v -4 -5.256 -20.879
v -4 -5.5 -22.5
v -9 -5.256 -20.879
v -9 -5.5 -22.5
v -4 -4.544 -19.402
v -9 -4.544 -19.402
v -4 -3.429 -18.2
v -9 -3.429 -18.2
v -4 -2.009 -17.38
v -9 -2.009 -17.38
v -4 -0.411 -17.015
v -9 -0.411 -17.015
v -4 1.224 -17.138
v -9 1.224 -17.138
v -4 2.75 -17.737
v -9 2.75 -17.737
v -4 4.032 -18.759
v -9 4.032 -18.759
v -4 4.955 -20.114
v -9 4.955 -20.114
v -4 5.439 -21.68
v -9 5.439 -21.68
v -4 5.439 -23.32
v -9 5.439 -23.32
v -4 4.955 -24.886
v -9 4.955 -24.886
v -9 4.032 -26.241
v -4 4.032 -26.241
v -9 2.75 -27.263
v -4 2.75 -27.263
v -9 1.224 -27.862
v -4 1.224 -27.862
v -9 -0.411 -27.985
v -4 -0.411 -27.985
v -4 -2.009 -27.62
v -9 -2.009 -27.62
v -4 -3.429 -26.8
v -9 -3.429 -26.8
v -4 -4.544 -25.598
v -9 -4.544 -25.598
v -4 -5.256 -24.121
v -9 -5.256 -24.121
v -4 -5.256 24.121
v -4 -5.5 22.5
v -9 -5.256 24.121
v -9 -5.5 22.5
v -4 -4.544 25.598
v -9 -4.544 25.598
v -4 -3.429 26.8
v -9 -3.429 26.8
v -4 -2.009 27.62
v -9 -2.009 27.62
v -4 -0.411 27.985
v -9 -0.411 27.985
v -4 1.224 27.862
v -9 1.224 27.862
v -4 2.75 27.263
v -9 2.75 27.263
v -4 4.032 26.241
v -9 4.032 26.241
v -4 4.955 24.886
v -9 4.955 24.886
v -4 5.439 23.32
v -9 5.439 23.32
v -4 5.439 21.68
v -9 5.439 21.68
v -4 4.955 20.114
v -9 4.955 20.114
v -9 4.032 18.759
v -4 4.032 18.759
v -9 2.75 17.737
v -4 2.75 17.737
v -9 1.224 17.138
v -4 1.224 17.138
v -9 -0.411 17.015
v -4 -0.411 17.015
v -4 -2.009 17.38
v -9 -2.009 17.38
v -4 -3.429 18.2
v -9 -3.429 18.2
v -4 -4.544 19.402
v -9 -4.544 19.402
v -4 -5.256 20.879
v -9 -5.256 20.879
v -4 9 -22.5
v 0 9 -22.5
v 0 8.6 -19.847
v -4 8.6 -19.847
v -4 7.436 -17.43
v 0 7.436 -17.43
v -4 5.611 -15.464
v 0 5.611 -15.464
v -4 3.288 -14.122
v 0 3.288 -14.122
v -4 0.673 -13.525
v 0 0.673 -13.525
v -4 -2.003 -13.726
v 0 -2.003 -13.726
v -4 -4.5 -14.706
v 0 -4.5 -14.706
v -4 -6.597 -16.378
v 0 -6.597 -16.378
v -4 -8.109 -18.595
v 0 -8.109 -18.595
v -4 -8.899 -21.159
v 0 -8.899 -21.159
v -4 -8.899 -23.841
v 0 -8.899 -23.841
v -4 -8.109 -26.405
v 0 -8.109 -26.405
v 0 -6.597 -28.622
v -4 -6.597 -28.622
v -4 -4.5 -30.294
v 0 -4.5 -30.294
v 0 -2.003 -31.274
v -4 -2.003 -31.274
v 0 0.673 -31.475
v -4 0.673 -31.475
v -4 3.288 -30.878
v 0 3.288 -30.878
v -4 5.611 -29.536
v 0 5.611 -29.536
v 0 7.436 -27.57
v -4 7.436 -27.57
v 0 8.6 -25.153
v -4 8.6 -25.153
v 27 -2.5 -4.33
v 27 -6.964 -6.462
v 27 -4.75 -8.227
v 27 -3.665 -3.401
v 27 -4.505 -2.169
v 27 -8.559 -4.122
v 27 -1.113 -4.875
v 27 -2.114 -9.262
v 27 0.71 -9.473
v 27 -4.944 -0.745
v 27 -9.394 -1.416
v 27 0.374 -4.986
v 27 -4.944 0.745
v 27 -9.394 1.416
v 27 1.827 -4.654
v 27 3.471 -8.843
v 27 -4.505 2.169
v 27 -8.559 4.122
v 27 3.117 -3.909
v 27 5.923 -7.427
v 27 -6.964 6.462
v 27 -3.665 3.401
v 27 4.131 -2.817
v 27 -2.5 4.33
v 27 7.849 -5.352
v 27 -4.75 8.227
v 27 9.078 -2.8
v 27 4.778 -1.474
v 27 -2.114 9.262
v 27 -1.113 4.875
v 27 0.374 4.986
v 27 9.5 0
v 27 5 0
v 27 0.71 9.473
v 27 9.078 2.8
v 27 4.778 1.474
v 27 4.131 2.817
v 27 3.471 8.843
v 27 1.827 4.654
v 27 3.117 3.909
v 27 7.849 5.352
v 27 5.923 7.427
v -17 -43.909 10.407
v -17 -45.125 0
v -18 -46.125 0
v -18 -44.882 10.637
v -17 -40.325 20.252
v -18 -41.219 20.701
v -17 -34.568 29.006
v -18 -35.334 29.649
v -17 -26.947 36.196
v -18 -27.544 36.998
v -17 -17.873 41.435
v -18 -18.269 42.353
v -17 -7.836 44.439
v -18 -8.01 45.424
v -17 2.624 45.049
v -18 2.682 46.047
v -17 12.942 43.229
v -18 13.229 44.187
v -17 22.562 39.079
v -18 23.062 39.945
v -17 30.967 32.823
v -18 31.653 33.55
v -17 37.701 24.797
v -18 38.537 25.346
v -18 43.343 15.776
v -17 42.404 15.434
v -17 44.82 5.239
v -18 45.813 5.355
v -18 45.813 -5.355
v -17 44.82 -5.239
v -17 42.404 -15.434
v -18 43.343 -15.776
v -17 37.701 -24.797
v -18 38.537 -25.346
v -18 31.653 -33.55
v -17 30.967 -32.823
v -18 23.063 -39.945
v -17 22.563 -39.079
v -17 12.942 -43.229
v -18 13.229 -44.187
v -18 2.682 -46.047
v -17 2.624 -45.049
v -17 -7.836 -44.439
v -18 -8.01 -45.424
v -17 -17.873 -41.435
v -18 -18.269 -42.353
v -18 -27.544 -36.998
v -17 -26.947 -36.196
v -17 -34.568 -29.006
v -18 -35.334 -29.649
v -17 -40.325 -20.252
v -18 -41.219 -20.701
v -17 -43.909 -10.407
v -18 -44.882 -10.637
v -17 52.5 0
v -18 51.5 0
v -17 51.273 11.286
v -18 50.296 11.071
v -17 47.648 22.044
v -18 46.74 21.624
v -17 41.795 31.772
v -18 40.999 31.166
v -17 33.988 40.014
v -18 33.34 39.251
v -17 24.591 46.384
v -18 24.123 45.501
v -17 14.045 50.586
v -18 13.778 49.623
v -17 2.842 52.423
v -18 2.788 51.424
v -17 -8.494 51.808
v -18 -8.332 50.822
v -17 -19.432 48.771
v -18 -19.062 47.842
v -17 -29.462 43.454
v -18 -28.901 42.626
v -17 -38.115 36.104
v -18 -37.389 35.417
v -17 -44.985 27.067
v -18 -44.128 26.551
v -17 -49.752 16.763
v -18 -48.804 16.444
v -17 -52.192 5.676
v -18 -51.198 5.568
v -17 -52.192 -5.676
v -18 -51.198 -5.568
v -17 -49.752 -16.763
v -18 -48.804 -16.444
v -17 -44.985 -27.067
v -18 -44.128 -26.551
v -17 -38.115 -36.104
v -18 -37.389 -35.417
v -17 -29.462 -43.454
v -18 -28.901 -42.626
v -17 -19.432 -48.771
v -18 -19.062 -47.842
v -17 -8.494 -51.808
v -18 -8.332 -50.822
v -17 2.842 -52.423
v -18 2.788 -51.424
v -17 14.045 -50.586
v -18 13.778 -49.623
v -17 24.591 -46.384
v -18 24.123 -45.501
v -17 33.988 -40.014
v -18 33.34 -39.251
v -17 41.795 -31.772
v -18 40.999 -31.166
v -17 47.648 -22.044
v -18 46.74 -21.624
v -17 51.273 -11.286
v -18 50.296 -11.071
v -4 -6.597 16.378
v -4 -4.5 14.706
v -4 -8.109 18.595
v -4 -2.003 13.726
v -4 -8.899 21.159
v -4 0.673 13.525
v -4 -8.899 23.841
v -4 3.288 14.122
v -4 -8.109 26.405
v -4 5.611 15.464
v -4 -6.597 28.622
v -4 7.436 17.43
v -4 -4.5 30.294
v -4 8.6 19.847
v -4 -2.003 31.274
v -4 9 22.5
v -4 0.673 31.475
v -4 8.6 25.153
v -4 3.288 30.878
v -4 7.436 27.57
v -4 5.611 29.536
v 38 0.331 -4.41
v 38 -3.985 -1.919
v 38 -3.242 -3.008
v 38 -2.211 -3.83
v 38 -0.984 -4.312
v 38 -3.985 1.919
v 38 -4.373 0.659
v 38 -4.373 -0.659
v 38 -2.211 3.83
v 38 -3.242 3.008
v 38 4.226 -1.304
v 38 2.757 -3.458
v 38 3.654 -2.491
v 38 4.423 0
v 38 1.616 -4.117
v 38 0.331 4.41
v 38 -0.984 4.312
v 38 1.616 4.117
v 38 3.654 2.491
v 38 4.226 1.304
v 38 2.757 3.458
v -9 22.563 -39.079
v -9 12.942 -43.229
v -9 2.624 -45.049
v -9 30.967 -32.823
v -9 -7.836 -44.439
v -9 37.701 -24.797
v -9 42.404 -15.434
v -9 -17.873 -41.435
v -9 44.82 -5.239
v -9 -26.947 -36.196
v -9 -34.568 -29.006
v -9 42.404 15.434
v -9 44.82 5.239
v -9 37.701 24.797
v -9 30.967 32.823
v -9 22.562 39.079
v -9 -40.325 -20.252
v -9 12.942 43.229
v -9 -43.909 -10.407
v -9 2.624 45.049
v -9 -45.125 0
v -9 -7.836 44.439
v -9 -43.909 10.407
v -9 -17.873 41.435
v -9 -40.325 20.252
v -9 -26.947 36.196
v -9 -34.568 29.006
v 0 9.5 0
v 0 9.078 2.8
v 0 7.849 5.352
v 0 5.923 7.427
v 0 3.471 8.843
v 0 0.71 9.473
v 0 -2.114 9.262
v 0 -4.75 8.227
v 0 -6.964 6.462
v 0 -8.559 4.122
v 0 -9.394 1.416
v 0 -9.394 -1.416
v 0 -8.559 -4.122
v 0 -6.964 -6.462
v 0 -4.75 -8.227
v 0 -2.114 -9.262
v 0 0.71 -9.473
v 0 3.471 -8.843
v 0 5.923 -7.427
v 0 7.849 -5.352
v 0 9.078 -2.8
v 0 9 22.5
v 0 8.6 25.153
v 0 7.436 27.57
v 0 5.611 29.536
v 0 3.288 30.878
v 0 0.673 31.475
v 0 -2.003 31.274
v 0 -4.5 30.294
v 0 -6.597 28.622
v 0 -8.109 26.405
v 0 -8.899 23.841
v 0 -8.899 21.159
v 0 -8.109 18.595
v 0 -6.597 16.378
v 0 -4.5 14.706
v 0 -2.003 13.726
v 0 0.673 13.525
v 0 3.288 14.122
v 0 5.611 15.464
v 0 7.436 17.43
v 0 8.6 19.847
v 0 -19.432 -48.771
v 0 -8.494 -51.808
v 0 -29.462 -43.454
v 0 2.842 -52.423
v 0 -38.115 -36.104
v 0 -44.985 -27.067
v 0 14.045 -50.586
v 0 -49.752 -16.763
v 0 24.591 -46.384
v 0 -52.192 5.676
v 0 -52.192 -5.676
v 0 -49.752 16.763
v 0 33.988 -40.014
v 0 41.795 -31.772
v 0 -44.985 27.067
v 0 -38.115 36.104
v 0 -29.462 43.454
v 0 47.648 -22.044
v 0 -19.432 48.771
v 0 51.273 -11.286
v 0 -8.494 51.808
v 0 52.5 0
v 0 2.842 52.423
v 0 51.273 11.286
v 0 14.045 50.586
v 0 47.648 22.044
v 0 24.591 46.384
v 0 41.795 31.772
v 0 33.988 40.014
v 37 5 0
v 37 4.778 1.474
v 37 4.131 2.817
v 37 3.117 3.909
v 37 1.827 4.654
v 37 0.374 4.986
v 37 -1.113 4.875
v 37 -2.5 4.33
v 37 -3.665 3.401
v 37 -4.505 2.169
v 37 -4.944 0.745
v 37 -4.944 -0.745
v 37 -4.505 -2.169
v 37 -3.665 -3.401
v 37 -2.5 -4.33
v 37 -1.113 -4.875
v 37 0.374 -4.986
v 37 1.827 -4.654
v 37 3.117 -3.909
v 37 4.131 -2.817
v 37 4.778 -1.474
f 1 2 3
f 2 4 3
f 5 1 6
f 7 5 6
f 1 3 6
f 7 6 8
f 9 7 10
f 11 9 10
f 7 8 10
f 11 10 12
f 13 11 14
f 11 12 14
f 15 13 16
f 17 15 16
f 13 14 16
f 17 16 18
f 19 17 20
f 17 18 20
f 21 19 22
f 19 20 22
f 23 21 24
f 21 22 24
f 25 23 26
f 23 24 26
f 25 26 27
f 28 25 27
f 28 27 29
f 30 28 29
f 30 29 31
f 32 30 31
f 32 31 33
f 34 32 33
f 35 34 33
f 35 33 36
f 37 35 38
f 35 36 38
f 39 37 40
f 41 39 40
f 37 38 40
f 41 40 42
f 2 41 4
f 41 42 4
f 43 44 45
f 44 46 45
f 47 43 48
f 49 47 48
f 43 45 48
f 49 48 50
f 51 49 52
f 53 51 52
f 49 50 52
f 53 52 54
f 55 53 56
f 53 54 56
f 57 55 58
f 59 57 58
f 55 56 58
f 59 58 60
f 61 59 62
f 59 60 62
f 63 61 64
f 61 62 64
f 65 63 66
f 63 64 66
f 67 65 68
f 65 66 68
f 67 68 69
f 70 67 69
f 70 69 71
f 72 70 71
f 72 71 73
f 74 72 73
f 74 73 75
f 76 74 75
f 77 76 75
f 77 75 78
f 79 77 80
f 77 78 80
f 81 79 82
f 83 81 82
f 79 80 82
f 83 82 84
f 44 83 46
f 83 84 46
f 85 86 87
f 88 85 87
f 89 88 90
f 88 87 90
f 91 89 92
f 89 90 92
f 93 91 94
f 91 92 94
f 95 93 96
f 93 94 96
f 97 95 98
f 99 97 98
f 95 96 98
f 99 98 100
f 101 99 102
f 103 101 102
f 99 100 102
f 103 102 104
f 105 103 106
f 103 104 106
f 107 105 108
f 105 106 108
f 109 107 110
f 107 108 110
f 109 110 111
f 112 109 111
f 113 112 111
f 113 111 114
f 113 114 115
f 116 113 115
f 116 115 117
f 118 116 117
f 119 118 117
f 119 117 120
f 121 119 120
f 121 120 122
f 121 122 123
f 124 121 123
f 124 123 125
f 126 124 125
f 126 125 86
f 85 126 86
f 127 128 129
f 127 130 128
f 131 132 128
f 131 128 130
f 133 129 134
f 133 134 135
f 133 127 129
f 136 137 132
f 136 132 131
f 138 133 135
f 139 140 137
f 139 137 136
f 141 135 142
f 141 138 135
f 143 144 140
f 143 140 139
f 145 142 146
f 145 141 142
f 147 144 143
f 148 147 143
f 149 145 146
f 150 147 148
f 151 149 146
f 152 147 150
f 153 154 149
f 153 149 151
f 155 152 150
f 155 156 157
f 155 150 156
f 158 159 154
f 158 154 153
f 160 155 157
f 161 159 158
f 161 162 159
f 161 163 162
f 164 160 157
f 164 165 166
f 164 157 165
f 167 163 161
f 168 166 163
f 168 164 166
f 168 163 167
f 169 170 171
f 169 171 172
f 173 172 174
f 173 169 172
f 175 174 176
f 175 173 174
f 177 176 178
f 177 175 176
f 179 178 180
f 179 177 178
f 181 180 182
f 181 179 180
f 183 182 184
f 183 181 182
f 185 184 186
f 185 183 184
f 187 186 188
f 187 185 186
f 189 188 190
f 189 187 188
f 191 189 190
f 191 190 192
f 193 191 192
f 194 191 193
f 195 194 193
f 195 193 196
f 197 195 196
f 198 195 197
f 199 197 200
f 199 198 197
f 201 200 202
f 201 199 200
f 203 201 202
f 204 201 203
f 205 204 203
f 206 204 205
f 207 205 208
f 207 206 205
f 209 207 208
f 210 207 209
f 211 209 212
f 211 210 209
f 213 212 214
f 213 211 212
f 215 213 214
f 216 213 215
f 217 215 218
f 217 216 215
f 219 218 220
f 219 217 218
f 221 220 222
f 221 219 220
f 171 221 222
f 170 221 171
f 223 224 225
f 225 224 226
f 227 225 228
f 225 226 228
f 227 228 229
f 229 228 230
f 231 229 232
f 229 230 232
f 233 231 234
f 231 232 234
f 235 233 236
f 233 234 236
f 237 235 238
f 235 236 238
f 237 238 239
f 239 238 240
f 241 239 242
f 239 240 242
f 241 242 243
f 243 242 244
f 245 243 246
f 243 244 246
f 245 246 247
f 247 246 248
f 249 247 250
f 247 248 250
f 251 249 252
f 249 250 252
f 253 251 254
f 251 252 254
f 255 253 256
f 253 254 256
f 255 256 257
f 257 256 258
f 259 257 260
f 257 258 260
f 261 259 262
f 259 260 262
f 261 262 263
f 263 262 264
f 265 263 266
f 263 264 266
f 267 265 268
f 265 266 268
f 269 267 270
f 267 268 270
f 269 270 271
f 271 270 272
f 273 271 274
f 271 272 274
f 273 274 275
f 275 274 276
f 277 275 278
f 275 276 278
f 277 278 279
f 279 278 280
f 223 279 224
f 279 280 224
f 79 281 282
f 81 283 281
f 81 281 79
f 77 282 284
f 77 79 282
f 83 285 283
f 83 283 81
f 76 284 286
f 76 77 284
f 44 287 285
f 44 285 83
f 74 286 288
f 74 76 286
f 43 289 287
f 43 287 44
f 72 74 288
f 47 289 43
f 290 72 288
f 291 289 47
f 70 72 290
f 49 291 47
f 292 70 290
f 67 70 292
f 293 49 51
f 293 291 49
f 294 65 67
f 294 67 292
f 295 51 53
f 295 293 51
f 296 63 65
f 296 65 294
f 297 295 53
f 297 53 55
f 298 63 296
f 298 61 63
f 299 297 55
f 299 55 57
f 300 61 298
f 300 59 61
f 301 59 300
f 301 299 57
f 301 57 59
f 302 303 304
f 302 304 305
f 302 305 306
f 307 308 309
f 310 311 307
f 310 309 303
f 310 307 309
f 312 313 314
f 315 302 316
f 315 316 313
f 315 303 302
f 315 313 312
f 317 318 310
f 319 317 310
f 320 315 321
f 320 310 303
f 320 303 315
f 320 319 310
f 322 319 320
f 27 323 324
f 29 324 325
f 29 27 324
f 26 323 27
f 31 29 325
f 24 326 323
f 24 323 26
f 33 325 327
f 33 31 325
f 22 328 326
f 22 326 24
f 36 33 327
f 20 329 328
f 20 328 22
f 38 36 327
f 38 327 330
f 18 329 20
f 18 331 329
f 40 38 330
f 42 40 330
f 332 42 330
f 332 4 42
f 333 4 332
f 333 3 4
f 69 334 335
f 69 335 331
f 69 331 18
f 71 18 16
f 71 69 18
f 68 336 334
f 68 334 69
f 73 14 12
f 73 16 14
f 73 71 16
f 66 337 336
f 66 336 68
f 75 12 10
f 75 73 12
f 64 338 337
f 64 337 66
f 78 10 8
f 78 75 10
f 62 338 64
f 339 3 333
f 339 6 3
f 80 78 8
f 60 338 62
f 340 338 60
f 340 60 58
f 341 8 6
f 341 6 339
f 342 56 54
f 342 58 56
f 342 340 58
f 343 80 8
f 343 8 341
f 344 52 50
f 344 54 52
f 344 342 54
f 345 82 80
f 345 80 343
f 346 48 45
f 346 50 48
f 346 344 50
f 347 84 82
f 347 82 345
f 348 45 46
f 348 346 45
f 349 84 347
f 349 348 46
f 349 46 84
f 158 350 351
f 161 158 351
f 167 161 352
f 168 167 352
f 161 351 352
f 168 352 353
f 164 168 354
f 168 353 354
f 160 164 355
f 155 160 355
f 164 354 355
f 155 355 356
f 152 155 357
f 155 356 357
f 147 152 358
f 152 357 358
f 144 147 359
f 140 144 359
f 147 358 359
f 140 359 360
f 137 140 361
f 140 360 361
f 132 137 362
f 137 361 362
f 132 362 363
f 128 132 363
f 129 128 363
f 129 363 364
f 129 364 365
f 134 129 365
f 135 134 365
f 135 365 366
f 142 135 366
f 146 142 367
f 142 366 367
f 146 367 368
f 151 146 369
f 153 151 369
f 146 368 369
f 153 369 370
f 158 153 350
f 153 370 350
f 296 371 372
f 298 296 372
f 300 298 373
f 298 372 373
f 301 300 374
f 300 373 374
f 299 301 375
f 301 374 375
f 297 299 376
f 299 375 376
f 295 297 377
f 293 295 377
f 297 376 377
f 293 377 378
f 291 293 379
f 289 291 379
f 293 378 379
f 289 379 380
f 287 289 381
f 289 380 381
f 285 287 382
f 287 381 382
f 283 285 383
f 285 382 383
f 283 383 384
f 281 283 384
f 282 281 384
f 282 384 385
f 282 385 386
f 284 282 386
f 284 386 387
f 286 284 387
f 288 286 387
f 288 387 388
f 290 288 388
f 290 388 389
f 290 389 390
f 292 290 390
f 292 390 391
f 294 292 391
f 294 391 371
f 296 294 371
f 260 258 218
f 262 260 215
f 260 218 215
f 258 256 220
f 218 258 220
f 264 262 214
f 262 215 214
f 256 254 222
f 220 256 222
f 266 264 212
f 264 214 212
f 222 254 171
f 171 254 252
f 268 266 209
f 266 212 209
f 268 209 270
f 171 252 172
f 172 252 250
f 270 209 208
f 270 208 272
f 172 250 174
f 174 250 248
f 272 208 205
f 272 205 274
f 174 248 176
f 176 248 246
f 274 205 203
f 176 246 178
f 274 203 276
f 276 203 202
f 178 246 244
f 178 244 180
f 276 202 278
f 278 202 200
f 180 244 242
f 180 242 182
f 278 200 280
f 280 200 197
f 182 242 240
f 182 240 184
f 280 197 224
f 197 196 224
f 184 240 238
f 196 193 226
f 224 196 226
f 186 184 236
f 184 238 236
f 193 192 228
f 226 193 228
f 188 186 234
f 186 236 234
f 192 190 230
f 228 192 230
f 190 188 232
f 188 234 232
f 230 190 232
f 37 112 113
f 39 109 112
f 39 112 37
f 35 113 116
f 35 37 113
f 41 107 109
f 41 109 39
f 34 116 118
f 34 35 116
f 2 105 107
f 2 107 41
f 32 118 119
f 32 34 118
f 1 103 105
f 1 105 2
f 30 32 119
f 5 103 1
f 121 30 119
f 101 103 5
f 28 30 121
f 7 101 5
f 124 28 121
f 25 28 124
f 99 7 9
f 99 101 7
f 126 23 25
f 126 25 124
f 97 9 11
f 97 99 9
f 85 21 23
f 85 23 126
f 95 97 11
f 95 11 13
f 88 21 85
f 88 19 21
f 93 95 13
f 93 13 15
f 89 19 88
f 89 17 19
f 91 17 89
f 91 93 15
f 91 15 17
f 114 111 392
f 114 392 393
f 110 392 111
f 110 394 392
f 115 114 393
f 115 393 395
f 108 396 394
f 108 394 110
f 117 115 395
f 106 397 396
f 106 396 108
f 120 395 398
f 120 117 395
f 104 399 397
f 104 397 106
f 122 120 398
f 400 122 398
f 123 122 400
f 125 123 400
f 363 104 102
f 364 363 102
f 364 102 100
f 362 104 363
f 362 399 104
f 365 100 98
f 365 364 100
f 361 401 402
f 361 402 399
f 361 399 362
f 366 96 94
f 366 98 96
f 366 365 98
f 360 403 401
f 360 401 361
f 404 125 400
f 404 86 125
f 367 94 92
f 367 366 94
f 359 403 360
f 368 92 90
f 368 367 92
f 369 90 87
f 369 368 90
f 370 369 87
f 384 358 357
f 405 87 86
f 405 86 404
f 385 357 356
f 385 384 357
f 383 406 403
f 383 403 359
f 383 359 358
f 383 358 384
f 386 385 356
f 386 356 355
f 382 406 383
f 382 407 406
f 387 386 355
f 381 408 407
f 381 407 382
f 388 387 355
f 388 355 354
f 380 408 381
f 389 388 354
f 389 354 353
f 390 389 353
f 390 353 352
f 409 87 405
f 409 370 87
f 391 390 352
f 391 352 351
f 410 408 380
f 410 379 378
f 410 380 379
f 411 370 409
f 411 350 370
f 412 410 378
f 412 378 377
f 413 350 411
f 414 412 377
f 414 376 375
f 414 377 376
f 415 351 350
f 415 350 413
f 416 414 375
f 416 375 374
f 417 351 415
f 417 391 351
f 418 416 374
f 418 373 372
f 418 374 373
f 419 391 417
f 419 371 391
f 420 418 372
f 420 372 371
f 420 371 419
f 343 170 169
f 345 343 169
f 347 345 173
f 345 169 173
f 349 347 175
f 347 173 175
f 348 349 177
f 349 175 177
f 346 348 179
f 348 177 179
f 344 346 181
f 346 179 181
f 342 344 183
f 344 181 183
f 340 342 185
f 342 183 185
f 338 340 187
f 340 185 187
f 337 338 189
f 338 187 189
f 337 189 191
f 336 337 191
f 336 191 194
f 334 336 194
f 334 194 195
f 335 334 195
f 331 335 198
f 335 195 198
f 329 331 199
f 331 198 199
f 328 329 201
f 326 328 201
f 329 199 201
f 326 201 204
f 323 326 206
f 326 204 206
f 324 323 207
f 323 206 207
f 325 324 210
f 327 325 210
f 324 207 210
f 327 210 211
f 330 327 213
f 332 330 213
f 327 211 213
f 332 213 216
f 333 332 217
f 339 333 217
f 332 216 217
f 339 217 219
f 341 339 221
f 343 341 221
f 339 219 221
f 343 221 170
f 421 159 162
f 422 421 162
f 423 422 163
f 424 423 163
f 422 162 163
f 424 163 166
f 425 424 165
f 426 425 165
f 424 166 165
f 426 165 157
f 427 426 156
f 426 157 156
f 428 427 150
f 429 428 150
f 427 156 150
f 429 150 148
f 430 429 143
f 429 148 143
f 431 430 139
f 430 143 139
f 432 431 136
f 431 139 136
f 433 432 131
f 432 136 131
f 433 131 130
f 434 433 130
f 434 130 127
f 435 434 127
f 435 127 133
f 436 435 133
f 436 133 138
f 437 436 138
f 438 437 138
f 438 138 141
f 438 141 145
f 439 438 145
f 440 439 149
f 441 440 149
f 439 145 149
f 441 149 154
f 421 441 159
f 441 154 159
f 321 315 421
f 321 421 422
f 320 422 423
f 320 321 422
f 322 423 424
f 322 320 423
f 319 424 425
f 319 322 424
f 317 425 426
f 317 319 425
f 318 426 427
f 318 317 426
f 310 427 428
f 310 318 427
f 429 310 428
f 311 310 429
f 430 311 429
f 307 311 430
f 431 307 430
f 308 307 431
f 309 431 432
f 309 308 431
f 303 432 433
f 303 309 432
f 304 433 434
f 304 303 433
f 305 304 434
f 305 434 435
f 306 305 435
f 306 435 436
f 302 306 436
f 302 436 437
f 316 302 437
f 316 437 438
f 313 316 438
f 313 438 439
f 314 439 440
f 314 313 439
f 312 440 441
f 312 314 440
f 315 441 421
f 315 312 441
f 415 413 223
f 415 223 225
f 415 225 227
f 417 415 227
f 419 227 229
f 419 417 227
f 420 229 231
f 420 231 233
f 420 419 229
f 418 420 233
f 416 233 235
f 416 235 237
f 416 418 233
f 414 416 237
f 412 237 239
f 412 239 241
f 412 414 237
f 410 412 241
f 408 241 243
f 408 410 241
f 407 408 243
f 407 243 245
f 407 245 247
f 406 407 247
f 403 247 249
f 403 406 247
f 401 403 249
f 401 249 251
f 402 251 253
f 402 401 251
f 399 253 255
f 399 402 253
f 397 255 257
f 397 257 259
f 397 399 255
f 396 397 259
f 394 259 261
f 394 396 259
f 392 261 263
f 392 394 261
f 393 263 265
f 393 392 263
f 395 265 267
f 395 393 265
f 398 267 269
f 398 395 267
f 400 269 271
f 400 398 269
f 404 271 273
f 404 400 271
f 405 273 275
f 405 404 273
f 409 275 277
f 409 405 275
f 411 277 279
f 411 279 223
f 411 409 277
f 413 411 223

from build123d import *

# Parameters (mm, degrees)
F0_R            = 52.5
F1_DEPTH        = 18
F2_R            = 45.125
F3_DEPTH        = 9
F4_SIZE         = 1
F5_R            = 9.5
F6_DEPTH        = 27
F7_R            = 5
F8_DEPTH        = 11
F9_SIZE2        = 0.5773502692
F9_SIZE         = 1
F11_D           = 11
F11_CBORE_D     = 18
F11_CBORE_DEPTH = 4


with BuildPart() as f1:
    # F0 (on Right) → F1 (new body)
    with BuildSketch(Plane.YZ):
        Circle(F0_R)
    extrude(amount=-F1_DEPTH)

    # F2 (on face) → F3 (cut)
    with BuildSketch(Plane(origin=(-18, 0, 0), x_dir=(0, -1, 0), z_dir=(-1, 0, 0))):
        Circle(F2_R)
    extrude(amount=-F3_DEPTH, mode=Mode.SUBTRACT)

    # F4
    f4_edges = [f1.edges().sort_by_distance(p)[0] for p in [
        (-18, -52.5, 0),
        (-18, 45.125, 0),
    ]]
    chamfer(f4_edges, length=F4_SIZE)

    # F5 (on face) → F6 (join)
    with BuildSketch(Plane.YZ):
        Circle(F5_R)
    extrude(amount=F6_DEPTH)

    # F7 (on face) → F8 (join)
    with BuildSketch(Plane.YZ.offset(27)):
        Circle(F7_R)
    extrude(amount=F8_DEPTH)

    # F9
    f9_edges = [f1.edges().sort_by_distance(p)[0] for p in [
        (38, -5, 0),
    ]]
    f9_side = f1.faces().sort_by_distance((32.5, -5, 0))[0]
    chamfer(f9_edges, length=F9_SIZE, length2=F9_SIZE2, reference=f9_side)

    # F11 (through all)
    with Locations(Plane.YZ):
        with Locations((0, -22.5), (0, 22.5)):
            CounterBoreHole(F11_D / 2, F11_CBORE_D / 2, F11_CBORE_DEPTH)


solid = f1.part
